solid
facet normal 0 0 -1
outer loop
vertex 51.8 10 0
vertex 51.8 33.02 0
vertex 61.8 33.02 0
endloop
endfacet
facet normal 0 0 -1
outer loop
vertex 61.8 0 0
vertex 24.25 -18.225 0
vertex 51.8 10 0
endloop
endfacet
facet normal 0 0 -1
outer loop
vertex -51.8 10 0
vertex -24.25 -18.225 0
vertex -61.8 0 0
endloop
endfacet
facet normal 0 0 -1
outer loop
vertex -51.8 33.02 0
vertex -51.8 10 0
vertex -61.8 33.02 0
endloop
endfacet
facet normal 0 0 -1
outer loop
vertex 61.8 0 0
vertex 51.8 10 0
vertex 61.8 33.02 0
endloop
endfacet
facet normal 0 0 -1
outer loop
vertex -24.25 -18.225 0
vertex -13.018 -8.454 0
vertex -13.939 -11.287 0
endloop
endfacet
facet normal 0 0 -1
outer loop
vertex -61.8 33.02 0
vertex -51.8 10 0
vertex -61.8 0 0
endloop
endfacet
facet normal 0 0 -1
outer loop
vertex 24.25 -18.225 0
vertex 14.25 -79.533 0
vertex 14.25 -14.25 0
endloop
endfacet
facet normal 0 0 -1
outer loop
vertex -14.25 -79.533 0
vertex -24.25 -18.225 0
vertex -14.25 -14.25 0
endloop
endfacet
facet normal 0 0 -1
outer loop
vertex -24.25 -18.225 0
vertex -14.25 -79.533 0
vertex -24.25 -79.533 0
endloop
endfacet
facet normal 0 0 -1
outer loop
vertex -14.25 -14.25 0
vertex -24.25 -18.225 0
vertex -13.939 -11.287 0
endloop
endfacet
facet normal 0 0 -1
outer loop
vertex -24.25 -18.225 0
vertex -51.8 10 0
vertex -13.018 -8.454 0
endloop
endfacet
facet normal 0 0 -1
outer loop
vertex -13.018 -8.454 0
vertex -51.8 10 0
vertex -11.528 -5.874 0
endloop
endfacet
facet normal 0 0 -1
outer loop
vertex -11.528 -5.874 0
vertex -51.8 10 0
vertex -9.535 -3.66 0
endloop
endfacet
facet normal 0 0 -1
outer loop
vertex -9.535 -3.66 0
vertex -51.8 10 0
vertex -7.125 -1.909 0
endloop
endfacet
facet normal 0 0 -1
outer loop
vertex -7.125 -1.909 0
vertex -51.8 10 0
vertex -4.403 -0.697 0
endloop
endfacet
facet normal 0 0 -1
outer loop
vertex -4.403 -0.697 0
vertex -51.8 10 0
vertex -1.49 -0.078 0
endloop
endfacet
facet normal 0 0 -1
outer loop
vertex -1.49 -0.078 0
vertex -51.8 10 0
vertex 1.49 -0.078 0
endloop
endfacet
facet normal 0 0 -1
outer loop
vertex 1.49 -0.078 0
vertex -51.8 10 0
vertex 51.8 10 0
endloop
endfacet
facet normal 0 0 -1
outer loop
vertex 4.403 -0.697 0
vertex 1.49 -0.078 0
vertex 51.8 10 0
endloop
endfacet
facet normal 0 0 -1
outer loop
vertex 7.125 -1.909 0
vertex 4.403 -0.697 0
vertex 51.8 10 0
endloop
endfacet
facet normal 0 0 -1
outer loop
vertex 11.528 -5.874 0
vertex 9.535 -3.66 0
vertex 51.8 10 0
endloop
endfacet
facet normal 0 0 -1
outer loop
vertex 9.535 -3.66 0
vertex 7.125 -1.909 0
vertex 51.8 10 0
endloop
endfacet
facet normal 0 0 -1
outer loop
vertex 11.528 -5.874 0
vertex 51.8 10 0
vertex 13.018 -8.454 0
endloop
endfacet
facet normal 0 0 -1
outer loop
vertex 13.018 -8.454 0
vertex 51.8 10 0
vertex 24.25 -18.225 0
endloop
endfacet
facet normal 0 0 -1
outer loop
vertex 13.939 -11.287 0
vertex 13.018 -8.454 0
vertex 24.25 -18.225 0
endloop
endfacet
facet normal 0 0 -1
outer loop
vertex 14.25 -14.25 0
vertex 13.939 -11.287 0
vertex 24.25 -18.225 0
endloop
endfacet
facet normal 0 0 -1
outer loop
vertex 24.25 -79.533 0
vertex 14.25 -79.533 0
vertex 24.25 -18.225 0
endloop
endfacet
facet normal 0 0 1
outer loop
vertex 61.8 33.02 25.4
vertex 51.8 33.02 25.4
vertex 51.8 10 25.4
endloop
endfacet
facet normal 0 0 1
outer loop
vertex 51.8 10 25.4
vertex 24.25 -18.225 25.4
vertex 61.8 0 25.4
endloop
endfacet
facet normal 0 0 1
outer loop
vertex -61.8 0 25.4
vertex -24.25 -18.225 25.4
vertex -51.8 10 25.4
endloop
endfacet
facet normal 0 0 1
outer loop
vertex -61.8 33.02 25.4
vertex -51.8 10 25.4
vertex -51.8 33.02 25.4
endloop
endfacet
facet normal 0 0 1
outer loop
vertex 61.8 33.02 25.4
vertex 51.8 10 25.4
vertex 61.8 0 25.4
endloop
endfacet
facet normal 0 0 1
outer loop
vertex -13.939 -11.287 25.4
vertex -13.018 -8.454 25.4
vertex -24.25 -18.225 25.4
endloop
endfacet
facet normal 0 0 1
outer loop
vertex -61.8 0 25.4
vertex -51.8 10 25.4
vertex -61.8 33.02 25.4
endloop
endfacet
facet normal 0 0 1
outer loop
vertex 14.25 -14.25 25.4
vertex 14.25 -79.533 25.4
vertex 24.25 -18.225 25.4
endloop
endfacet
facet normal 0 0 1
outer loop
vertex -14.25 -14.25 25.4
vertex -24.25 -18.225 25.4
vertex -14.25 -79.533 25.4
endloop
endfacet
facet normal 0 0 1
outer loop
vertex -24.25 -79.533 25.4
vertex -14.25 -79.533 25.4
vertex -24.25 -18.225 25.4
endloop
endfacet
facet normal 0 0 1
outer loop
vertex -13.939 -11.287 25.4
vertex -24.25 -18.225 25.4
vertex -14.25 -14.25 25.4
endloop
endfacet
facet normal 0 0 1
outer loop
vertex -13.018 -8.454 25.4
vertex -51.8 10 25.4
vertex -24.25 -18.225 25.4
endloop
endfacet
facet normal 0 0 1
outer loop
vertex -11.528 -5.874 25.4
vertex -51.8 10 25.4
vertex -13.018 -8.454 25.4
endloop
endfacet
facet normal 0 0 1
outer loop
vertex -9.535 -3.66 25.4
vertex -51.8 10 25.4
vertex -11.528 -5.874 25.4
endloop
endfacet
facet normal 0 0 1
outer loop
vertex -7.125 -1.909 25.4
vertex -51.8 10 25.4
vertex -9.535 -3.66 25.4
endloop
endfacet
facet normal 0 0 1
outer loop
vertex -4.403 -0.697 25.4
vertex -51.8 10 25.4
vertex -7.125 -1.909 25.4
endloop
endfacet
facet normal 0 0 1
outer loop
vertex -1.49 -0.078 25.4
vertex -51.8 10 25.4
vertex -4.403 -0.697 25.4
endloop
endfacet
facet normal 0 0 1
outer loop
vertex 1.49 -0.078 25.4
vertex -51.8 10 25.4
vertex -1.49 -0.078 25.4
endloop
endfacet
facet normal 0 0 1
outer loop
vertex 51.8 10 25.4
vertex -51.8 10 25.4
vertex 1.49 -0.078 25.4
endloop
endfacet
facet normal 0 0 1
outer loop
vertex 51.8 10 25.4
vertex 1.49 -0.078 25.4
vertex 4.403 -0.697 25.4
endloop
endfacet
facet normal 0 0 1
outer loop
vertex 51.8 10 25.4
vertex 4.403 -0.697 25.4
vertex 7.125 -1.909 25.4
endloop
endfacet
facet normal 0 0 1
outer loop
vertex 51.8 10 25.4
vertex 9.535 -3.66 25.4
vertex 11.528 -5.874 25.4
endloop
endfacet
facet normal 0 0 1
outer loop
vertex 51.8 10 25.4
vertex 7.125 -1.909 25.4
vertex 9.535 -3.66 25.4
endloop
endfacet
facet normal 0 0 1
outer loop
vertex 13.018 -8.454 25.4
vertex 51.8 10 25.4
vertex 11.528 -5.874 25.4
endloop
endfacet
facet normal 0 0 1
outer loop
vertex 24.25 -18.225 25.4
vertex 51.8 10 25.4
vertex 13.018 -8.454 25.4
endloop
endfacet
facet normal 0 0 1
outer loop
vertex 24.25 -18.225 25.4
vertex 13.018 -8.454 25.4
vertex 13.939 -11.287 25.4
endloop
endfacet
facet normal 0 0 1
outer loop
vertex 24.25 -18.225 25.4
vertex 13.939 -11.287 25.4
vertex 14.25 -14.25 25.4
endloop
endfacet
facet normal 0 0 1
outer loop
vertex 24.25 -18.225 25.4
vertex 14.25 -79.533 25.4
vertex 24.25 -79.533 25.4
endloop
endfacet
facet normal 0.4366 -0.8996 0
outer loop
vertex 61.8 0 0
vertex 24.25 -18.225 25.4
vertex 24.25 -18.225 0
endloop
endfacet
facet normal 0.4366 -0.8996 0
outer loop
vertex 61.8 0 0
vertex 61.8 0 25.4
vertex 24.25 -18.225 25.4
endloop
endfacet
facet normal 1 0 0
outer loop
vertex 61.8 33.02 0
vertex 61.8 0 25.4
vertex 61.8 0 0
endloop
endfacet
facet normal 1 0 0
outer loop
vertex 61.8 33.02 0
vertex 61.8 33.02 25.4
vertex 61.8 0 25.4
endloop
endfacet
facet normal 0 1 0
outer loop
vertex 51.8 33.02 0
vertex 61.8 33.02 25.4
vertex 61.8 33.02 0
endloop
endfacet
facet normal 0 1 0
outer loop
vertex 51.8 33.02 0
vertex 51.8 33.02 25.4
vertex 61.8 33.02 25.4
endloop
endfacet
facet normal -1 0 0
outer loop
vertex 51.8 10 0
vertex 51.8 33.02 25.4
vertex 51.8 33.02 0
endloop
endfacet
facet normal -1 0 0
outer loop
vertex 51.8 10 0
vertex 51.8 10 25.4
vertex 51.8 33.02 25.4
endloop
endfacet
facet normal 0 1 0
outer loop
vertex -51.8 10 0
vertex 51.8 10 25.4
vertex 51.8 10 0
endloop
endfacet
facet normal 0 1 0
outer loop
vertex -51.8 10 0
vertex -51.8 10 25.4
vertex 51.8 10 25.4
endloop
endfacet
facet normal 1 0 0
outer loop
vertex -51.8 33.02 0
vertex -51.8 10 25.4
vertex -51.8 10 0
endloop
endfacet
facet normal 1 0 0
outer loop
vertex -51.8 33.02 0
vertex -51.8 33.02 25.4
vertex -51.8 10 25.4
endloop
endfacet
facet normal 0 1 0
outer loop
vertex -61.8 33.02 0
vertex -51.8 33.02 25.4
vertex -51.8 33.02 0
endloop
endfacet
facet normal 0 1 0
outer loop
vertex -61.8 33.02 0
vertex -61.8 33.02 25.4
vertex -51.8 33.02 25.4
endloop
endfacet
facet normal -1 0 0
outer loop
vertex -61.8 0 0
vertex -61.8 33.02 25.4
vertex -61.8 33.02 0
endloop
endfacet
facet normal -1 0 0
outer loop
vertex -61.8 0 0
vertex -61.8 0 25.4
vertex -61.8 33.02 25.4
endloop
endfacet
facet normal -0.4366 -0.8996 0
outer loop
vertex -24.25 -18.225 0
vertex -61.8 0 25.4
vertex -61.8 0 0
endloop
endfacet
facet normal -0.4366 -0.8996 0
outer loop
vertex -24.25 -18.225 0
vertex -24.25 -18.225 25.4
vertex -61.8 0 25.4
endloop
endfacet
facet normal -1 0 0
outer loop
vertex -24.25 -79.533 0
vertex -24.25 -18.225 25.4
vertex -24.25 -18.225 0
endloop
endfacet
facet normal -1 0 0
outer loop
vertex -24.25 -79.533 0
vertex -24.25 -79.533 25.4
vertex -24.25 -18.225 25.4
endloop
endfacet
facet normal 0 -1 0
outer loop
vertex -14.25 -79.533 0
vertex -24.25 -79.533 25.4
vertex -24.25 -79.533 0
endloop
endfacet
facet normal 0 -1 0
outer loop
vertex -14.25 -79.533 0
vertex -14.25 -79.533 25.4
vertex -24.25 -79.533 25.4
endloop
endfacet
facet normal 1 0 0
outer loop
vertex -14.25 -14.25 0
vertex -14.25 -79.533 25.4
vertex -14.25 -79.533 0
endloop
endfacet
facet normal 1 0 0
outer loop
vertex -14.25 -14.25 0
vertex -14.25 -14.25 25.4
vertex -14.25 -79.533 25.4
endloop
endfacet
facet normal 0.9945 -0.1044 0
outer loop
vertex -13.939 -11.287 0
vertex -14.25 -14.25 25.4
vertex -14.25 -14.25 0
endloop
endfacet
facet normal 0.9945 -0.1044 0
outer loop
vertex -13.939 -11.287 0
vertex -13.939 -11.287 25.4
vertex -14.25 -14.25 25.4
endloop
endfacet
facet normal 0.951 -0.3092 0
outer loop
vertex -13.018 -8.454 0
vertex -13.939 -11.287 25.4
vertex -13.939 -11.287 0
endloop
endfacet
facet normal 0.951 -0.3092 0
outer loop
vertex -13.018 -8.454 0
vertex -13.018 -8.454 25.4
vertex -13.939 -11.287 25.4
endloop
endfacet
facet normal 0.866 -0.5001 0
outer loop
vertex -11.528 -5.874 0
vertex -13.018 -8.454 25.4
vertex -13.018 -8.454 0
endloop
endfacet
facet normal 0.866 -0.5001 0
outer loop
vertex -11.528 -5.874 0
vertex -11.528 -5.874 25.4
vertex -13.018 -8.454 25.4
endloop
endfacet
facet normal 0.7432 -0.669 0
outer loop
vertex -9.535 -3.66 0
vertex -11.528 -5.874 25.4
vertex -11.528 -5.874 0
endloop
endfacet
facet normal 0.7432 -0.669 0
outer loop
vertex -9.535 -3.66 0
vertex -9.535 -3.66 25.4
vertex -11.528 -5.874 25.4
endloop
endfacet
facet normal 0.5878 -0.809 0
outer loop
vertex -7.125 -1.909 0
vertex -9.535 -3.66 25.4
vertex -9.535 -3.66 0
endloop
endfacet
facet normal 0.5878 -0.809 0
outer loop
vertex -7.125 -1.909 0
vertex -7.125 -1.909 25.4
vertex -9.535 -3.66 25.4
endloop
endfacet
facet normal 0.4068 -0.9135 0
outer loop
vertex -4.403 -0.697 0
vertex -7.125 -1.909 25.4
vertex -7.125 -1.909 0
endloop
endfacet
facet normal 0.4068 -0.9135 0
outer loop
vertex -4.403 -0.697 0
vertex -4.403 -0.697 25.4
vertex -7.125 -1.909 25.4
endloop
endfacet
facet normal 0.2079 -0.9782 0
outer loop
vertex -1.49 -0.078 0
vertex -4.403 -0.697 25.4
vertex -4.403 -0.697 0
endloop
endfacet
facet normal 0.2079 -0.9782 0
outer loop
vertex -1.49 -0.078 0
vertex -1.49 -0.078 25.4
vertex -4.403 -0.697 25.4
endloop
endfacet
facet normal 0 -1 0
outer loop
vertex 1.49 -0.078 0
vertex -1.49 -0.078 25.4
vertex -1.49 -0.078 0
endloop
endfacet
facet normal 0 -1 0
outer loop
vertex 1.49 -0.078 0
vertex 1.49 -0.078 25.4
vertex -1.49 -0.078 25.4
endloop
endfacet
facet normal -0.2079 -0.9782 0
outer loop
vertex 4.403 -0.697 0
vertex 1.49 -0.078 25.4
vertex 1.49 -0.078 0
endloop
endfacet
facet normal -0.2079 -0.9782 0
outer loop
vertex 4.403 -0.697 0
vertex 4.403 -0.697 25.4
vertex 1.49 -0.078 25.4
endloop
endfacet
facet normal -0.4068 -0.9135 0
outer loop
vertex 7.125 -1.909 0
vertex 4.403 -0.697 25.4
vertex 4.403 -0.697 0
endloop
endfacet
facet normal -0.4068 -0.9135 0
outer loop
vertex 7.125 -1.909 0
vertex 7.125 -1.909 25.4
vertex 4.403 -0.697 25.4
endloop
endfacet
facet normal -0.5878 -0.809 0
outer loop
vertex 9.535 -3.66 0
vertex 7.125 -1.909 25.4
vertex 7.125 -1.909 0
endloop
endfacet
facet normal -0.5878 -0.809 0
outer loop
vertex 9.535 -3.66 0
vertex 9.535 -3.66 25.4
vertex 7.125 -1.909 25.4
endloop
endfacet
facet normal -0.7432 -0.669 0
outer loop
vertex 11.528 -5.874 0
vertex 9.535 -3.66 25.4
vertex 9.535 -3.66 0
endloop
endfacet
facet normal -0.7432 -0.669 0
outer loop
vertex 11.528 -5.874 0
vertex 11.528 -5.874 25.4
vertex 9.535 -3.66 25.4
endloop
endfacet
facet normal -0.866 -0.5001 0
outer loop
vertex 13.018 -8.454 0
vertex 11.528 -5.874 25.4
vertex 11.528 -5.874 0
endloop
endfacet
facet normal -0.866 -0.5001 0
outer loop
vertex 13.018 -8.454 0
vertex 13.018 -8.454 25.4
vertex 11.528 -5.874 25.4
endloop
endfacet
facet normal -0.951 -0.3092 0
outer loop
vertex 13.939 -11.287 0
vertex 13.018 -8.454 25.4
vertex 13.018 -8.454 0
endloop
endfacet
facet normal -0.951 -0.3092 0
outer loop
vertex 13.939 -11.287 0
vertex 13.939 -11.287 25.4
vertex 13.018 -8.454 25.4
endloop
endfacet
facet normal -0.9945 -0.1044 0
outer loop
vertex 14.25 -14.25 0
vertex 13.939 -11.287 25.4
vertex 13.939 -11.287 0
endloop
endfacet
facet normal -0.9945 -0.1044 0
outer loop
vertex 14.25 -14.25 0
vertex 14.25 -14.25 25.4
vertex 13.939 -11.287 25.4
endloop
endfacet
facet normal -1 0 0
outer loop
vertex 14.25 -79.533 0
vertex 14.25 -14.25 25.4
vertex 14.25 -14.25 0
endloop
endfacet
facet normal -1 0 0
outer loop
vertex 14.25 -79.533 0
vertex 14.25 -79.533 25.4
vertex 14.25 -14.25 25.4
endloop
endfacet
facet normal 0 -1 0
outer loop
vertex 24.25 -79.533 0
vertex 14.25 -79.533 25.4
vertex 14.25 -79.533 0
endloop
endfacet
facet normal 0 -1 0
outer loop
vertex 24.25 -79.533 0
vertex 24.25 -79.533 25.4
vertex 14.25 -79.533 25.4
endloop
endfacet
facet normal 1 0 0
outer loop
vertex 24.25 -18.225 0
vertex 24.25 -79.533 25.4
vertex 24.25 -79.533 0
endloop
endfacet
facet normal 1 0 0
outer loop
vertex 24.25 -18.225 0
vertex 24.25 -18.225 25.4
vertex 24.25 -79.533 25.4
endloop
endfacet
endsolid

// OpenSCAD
// Planter Bracket: attach a planter atop a cubicle partition.
// by David Pnhillip Oster
//
// Version 1.2  9/04/2019
//
// https://www.thingiverse.com/thing:3426884

// Size out of the plane.
bracketZ = 25.4;  // [0.5:0.5:100]

// length of the finger of the bracket gripping the planter.
planterFinger = 33.02;  // [0.5:0.5:100]

// Width of the planter
planterWidth = 101.6;  // [0.5:0.5:100]

// Slop to allow easy removal of the planter.
planterPadding = 2;  // [0:0.5:3]

bracketStyle = "simple";  // [sampler,  chamfered, sloped, simple]

// Treatment of partition top.
supportStyle = "circle";  // [circle, square]

// Width of the partition the planter will sit on.
partitionWidth = 28.5;  // [0.5:0.5:40]

// length of the finger of the bracket gripping the partition.
partitionFinger = 76.2; // [0.5:0.5:100]

// Thickness of the silhouette of the partition and planter fingers.
wallThick = 10; // [0.5:0.5:100]

// Thickness of the silhouette under the planter.
bottomWallThick = 10; // [0.5:0.5:100]

// Round rect radius at the top of the partition in square mode.
chamferRadius = 5;

/* [Hidden] */

// OpenSCAD can show graphic artifacts in preview mode when solids exactly touch.
// `epsilon` allows adjustment to prevent that but is too small to show in a print.
epsilon = 0.01;

planterTotalWidth = planterWidth + planterPadding;

// the left upper arm of the bracket. it grips the planter
module leftHalfBracket(bottomWallThick=bottomWallThick, wallThick=wallThick) {
  origin = [-epsilon, bottomWallThick];
  innerBottom = [planterTotalWidth/2, bottomWallThick];
  innerTop = [planterTotalWidth/2, planterFinger];
  outerTop = [planterTotalWidth/2+wallThick, planterFinger];
  outerBottom = [planterTotalWidth/2+wallThick, 0];
  originBottom = [-epsilon, -3*wallThick];
  polygon(points = [origin, innerBottom, innerTop, outerTop, outerBottom, originBottom]);
}

// the right upper arm of the bracket. it grips the planter
module rightHalfBracket(bottomWallThick=bottomWallThick, wallThick=wallThick) {
  scale([-1, 1, 1]){
    leftHalfBracket(bottomWallThick, wallThick);
  }
}

// solidPartitionFingers - partitionHole is the partition fingers.
module solidPartitionFingers(wallThick=wallThick) {
  translate([-(wallThick*2 + partitionWidth)/2, -(partitionFinger + wallThick/3)]) {
    square([wallThick*2 + partitionWidth, partitionFinger + wallThick/3]);
  }
}

// The bracket minus the hole for the partition.
module solidBracket(bottomWallThick=bottomWallThick, wallThick=wallThick) {
  leftHalfBracket(bottomWallThick, wallThick);
  rightHalfBracket(bottomWallThick, wallThick);
  solidPartitionFingers(wallThick);
}

// The hole for the partition partition. Top of the hole is at the origin.
module partitionHole() {
  translate([0, -(partitionWidth/2)]) {
    translate([-partitionWidth/2, -(partitionFinger+epsilon)]) {
      square([partitionWidth, partitionFinger+epsilon]);
    }
    if (supportStyle == "circle") {
      circle(d=partitionWidth, $fn=30);
    } else {
      hull() {
        for (j =  [-1:2:1]) {
          for (i = [-1:2:1]) {
            translate([i * ((partitionWidth-chamferRadius)/2),
                       j * ((partitionWidth-chamferRadius)/2)]) {
              circle(d=chamferRadius);
            }
          }
        }
      }
    }
  }
}

// complete simple style bracket.
module completeSimpleBracket(bottomWallThick=bottomWallThick, wallThick=wallThick, bracketZ=bracketZ) {
  linear_extrude(height = bracketZ) {
    difference() {
      solidBracket(bottomWallThick, wallThick);
      partitionHole();
    }
  }
}

module slopedSolidBracket() {
  hull() {
    completeSimpleBracket(bottomWallThick, wallThick/2, bracketZ + wallThick);
    translate([0, 0, wallThick/2]) {
      completeSimpleBracket(bottomWallThick, wallThick, bracketZ);
    }
  }
}

module chamferSolidBracket() {
  hull() {
    linear_extrude(height = bracketZ+wallThick) {
      leftHalfBracket(bottomWallThick, wallThick/2);
      rightHalfBracket(bottomWallThick, wallThick/2);
    }
    translate([0, 0, wallThick/2]) {
      linear_extrude(height = bracketZ) {
        leftHalfBracket(bottomWallThick, wallThick);
        rightHalfBracket(bottomWallThick, wallThick);
      }
    }
  }
  hull() {
    linear_extrude(height = bracketZ+wallThick) {
      solidPartitionFingers(wallThick/2);
    }
    translate([0, 0, wallThick/2]) {
      linear_extrude(height = bracketZ) {
        solidPartitionFingers(wallThick);
      }
    }
  }
}

module solidPartitionHole() {
  translate([0, 0, -wallThick/2]) {
    linear_extrude(height = bracketZ + 3*wallThick) {
      partitionHole();
    }
  }
}

module solidPlanerHole() {
  translate([-planterTotalWidth/2, bottomWallThick, -wallThick/2]) {
    cube([planterTotalWidth, 3*planterTotalWidth, bracketZ + 3*wallThick]);
  }
}

// complete slope-sided style bracket.
module completeSlopedBracket() {
  difference() {
    slopedSolidBracket();
    solidPartitionHole();
    solidPlanerHole();
  }
}


// complete chamfered style bracket.
module completeChamferBracket() {
  difference() {
    chamferSolidBracket();
    solidPartitionHole();
    solidPlanerHole();
  }
}

if (bracketStyle == "chamfered") {
  completeChamferBracket();
} else if (bracketStyle == "sloped") {
  completeSlopedBracket();
} else if (bracketStyle == "sampler"){
  completeSimpleBracket();
  translate([0, 0, bracketZ + 6*wallThick]) {
    completeChamferBracket();
  }
  translate([0, 0, 2*(bracketZ + 6*wallThick)]) {
    completeSlopedBracket();
  }
} else {  // i.e simple.
  completeSimpleBracket();
}
